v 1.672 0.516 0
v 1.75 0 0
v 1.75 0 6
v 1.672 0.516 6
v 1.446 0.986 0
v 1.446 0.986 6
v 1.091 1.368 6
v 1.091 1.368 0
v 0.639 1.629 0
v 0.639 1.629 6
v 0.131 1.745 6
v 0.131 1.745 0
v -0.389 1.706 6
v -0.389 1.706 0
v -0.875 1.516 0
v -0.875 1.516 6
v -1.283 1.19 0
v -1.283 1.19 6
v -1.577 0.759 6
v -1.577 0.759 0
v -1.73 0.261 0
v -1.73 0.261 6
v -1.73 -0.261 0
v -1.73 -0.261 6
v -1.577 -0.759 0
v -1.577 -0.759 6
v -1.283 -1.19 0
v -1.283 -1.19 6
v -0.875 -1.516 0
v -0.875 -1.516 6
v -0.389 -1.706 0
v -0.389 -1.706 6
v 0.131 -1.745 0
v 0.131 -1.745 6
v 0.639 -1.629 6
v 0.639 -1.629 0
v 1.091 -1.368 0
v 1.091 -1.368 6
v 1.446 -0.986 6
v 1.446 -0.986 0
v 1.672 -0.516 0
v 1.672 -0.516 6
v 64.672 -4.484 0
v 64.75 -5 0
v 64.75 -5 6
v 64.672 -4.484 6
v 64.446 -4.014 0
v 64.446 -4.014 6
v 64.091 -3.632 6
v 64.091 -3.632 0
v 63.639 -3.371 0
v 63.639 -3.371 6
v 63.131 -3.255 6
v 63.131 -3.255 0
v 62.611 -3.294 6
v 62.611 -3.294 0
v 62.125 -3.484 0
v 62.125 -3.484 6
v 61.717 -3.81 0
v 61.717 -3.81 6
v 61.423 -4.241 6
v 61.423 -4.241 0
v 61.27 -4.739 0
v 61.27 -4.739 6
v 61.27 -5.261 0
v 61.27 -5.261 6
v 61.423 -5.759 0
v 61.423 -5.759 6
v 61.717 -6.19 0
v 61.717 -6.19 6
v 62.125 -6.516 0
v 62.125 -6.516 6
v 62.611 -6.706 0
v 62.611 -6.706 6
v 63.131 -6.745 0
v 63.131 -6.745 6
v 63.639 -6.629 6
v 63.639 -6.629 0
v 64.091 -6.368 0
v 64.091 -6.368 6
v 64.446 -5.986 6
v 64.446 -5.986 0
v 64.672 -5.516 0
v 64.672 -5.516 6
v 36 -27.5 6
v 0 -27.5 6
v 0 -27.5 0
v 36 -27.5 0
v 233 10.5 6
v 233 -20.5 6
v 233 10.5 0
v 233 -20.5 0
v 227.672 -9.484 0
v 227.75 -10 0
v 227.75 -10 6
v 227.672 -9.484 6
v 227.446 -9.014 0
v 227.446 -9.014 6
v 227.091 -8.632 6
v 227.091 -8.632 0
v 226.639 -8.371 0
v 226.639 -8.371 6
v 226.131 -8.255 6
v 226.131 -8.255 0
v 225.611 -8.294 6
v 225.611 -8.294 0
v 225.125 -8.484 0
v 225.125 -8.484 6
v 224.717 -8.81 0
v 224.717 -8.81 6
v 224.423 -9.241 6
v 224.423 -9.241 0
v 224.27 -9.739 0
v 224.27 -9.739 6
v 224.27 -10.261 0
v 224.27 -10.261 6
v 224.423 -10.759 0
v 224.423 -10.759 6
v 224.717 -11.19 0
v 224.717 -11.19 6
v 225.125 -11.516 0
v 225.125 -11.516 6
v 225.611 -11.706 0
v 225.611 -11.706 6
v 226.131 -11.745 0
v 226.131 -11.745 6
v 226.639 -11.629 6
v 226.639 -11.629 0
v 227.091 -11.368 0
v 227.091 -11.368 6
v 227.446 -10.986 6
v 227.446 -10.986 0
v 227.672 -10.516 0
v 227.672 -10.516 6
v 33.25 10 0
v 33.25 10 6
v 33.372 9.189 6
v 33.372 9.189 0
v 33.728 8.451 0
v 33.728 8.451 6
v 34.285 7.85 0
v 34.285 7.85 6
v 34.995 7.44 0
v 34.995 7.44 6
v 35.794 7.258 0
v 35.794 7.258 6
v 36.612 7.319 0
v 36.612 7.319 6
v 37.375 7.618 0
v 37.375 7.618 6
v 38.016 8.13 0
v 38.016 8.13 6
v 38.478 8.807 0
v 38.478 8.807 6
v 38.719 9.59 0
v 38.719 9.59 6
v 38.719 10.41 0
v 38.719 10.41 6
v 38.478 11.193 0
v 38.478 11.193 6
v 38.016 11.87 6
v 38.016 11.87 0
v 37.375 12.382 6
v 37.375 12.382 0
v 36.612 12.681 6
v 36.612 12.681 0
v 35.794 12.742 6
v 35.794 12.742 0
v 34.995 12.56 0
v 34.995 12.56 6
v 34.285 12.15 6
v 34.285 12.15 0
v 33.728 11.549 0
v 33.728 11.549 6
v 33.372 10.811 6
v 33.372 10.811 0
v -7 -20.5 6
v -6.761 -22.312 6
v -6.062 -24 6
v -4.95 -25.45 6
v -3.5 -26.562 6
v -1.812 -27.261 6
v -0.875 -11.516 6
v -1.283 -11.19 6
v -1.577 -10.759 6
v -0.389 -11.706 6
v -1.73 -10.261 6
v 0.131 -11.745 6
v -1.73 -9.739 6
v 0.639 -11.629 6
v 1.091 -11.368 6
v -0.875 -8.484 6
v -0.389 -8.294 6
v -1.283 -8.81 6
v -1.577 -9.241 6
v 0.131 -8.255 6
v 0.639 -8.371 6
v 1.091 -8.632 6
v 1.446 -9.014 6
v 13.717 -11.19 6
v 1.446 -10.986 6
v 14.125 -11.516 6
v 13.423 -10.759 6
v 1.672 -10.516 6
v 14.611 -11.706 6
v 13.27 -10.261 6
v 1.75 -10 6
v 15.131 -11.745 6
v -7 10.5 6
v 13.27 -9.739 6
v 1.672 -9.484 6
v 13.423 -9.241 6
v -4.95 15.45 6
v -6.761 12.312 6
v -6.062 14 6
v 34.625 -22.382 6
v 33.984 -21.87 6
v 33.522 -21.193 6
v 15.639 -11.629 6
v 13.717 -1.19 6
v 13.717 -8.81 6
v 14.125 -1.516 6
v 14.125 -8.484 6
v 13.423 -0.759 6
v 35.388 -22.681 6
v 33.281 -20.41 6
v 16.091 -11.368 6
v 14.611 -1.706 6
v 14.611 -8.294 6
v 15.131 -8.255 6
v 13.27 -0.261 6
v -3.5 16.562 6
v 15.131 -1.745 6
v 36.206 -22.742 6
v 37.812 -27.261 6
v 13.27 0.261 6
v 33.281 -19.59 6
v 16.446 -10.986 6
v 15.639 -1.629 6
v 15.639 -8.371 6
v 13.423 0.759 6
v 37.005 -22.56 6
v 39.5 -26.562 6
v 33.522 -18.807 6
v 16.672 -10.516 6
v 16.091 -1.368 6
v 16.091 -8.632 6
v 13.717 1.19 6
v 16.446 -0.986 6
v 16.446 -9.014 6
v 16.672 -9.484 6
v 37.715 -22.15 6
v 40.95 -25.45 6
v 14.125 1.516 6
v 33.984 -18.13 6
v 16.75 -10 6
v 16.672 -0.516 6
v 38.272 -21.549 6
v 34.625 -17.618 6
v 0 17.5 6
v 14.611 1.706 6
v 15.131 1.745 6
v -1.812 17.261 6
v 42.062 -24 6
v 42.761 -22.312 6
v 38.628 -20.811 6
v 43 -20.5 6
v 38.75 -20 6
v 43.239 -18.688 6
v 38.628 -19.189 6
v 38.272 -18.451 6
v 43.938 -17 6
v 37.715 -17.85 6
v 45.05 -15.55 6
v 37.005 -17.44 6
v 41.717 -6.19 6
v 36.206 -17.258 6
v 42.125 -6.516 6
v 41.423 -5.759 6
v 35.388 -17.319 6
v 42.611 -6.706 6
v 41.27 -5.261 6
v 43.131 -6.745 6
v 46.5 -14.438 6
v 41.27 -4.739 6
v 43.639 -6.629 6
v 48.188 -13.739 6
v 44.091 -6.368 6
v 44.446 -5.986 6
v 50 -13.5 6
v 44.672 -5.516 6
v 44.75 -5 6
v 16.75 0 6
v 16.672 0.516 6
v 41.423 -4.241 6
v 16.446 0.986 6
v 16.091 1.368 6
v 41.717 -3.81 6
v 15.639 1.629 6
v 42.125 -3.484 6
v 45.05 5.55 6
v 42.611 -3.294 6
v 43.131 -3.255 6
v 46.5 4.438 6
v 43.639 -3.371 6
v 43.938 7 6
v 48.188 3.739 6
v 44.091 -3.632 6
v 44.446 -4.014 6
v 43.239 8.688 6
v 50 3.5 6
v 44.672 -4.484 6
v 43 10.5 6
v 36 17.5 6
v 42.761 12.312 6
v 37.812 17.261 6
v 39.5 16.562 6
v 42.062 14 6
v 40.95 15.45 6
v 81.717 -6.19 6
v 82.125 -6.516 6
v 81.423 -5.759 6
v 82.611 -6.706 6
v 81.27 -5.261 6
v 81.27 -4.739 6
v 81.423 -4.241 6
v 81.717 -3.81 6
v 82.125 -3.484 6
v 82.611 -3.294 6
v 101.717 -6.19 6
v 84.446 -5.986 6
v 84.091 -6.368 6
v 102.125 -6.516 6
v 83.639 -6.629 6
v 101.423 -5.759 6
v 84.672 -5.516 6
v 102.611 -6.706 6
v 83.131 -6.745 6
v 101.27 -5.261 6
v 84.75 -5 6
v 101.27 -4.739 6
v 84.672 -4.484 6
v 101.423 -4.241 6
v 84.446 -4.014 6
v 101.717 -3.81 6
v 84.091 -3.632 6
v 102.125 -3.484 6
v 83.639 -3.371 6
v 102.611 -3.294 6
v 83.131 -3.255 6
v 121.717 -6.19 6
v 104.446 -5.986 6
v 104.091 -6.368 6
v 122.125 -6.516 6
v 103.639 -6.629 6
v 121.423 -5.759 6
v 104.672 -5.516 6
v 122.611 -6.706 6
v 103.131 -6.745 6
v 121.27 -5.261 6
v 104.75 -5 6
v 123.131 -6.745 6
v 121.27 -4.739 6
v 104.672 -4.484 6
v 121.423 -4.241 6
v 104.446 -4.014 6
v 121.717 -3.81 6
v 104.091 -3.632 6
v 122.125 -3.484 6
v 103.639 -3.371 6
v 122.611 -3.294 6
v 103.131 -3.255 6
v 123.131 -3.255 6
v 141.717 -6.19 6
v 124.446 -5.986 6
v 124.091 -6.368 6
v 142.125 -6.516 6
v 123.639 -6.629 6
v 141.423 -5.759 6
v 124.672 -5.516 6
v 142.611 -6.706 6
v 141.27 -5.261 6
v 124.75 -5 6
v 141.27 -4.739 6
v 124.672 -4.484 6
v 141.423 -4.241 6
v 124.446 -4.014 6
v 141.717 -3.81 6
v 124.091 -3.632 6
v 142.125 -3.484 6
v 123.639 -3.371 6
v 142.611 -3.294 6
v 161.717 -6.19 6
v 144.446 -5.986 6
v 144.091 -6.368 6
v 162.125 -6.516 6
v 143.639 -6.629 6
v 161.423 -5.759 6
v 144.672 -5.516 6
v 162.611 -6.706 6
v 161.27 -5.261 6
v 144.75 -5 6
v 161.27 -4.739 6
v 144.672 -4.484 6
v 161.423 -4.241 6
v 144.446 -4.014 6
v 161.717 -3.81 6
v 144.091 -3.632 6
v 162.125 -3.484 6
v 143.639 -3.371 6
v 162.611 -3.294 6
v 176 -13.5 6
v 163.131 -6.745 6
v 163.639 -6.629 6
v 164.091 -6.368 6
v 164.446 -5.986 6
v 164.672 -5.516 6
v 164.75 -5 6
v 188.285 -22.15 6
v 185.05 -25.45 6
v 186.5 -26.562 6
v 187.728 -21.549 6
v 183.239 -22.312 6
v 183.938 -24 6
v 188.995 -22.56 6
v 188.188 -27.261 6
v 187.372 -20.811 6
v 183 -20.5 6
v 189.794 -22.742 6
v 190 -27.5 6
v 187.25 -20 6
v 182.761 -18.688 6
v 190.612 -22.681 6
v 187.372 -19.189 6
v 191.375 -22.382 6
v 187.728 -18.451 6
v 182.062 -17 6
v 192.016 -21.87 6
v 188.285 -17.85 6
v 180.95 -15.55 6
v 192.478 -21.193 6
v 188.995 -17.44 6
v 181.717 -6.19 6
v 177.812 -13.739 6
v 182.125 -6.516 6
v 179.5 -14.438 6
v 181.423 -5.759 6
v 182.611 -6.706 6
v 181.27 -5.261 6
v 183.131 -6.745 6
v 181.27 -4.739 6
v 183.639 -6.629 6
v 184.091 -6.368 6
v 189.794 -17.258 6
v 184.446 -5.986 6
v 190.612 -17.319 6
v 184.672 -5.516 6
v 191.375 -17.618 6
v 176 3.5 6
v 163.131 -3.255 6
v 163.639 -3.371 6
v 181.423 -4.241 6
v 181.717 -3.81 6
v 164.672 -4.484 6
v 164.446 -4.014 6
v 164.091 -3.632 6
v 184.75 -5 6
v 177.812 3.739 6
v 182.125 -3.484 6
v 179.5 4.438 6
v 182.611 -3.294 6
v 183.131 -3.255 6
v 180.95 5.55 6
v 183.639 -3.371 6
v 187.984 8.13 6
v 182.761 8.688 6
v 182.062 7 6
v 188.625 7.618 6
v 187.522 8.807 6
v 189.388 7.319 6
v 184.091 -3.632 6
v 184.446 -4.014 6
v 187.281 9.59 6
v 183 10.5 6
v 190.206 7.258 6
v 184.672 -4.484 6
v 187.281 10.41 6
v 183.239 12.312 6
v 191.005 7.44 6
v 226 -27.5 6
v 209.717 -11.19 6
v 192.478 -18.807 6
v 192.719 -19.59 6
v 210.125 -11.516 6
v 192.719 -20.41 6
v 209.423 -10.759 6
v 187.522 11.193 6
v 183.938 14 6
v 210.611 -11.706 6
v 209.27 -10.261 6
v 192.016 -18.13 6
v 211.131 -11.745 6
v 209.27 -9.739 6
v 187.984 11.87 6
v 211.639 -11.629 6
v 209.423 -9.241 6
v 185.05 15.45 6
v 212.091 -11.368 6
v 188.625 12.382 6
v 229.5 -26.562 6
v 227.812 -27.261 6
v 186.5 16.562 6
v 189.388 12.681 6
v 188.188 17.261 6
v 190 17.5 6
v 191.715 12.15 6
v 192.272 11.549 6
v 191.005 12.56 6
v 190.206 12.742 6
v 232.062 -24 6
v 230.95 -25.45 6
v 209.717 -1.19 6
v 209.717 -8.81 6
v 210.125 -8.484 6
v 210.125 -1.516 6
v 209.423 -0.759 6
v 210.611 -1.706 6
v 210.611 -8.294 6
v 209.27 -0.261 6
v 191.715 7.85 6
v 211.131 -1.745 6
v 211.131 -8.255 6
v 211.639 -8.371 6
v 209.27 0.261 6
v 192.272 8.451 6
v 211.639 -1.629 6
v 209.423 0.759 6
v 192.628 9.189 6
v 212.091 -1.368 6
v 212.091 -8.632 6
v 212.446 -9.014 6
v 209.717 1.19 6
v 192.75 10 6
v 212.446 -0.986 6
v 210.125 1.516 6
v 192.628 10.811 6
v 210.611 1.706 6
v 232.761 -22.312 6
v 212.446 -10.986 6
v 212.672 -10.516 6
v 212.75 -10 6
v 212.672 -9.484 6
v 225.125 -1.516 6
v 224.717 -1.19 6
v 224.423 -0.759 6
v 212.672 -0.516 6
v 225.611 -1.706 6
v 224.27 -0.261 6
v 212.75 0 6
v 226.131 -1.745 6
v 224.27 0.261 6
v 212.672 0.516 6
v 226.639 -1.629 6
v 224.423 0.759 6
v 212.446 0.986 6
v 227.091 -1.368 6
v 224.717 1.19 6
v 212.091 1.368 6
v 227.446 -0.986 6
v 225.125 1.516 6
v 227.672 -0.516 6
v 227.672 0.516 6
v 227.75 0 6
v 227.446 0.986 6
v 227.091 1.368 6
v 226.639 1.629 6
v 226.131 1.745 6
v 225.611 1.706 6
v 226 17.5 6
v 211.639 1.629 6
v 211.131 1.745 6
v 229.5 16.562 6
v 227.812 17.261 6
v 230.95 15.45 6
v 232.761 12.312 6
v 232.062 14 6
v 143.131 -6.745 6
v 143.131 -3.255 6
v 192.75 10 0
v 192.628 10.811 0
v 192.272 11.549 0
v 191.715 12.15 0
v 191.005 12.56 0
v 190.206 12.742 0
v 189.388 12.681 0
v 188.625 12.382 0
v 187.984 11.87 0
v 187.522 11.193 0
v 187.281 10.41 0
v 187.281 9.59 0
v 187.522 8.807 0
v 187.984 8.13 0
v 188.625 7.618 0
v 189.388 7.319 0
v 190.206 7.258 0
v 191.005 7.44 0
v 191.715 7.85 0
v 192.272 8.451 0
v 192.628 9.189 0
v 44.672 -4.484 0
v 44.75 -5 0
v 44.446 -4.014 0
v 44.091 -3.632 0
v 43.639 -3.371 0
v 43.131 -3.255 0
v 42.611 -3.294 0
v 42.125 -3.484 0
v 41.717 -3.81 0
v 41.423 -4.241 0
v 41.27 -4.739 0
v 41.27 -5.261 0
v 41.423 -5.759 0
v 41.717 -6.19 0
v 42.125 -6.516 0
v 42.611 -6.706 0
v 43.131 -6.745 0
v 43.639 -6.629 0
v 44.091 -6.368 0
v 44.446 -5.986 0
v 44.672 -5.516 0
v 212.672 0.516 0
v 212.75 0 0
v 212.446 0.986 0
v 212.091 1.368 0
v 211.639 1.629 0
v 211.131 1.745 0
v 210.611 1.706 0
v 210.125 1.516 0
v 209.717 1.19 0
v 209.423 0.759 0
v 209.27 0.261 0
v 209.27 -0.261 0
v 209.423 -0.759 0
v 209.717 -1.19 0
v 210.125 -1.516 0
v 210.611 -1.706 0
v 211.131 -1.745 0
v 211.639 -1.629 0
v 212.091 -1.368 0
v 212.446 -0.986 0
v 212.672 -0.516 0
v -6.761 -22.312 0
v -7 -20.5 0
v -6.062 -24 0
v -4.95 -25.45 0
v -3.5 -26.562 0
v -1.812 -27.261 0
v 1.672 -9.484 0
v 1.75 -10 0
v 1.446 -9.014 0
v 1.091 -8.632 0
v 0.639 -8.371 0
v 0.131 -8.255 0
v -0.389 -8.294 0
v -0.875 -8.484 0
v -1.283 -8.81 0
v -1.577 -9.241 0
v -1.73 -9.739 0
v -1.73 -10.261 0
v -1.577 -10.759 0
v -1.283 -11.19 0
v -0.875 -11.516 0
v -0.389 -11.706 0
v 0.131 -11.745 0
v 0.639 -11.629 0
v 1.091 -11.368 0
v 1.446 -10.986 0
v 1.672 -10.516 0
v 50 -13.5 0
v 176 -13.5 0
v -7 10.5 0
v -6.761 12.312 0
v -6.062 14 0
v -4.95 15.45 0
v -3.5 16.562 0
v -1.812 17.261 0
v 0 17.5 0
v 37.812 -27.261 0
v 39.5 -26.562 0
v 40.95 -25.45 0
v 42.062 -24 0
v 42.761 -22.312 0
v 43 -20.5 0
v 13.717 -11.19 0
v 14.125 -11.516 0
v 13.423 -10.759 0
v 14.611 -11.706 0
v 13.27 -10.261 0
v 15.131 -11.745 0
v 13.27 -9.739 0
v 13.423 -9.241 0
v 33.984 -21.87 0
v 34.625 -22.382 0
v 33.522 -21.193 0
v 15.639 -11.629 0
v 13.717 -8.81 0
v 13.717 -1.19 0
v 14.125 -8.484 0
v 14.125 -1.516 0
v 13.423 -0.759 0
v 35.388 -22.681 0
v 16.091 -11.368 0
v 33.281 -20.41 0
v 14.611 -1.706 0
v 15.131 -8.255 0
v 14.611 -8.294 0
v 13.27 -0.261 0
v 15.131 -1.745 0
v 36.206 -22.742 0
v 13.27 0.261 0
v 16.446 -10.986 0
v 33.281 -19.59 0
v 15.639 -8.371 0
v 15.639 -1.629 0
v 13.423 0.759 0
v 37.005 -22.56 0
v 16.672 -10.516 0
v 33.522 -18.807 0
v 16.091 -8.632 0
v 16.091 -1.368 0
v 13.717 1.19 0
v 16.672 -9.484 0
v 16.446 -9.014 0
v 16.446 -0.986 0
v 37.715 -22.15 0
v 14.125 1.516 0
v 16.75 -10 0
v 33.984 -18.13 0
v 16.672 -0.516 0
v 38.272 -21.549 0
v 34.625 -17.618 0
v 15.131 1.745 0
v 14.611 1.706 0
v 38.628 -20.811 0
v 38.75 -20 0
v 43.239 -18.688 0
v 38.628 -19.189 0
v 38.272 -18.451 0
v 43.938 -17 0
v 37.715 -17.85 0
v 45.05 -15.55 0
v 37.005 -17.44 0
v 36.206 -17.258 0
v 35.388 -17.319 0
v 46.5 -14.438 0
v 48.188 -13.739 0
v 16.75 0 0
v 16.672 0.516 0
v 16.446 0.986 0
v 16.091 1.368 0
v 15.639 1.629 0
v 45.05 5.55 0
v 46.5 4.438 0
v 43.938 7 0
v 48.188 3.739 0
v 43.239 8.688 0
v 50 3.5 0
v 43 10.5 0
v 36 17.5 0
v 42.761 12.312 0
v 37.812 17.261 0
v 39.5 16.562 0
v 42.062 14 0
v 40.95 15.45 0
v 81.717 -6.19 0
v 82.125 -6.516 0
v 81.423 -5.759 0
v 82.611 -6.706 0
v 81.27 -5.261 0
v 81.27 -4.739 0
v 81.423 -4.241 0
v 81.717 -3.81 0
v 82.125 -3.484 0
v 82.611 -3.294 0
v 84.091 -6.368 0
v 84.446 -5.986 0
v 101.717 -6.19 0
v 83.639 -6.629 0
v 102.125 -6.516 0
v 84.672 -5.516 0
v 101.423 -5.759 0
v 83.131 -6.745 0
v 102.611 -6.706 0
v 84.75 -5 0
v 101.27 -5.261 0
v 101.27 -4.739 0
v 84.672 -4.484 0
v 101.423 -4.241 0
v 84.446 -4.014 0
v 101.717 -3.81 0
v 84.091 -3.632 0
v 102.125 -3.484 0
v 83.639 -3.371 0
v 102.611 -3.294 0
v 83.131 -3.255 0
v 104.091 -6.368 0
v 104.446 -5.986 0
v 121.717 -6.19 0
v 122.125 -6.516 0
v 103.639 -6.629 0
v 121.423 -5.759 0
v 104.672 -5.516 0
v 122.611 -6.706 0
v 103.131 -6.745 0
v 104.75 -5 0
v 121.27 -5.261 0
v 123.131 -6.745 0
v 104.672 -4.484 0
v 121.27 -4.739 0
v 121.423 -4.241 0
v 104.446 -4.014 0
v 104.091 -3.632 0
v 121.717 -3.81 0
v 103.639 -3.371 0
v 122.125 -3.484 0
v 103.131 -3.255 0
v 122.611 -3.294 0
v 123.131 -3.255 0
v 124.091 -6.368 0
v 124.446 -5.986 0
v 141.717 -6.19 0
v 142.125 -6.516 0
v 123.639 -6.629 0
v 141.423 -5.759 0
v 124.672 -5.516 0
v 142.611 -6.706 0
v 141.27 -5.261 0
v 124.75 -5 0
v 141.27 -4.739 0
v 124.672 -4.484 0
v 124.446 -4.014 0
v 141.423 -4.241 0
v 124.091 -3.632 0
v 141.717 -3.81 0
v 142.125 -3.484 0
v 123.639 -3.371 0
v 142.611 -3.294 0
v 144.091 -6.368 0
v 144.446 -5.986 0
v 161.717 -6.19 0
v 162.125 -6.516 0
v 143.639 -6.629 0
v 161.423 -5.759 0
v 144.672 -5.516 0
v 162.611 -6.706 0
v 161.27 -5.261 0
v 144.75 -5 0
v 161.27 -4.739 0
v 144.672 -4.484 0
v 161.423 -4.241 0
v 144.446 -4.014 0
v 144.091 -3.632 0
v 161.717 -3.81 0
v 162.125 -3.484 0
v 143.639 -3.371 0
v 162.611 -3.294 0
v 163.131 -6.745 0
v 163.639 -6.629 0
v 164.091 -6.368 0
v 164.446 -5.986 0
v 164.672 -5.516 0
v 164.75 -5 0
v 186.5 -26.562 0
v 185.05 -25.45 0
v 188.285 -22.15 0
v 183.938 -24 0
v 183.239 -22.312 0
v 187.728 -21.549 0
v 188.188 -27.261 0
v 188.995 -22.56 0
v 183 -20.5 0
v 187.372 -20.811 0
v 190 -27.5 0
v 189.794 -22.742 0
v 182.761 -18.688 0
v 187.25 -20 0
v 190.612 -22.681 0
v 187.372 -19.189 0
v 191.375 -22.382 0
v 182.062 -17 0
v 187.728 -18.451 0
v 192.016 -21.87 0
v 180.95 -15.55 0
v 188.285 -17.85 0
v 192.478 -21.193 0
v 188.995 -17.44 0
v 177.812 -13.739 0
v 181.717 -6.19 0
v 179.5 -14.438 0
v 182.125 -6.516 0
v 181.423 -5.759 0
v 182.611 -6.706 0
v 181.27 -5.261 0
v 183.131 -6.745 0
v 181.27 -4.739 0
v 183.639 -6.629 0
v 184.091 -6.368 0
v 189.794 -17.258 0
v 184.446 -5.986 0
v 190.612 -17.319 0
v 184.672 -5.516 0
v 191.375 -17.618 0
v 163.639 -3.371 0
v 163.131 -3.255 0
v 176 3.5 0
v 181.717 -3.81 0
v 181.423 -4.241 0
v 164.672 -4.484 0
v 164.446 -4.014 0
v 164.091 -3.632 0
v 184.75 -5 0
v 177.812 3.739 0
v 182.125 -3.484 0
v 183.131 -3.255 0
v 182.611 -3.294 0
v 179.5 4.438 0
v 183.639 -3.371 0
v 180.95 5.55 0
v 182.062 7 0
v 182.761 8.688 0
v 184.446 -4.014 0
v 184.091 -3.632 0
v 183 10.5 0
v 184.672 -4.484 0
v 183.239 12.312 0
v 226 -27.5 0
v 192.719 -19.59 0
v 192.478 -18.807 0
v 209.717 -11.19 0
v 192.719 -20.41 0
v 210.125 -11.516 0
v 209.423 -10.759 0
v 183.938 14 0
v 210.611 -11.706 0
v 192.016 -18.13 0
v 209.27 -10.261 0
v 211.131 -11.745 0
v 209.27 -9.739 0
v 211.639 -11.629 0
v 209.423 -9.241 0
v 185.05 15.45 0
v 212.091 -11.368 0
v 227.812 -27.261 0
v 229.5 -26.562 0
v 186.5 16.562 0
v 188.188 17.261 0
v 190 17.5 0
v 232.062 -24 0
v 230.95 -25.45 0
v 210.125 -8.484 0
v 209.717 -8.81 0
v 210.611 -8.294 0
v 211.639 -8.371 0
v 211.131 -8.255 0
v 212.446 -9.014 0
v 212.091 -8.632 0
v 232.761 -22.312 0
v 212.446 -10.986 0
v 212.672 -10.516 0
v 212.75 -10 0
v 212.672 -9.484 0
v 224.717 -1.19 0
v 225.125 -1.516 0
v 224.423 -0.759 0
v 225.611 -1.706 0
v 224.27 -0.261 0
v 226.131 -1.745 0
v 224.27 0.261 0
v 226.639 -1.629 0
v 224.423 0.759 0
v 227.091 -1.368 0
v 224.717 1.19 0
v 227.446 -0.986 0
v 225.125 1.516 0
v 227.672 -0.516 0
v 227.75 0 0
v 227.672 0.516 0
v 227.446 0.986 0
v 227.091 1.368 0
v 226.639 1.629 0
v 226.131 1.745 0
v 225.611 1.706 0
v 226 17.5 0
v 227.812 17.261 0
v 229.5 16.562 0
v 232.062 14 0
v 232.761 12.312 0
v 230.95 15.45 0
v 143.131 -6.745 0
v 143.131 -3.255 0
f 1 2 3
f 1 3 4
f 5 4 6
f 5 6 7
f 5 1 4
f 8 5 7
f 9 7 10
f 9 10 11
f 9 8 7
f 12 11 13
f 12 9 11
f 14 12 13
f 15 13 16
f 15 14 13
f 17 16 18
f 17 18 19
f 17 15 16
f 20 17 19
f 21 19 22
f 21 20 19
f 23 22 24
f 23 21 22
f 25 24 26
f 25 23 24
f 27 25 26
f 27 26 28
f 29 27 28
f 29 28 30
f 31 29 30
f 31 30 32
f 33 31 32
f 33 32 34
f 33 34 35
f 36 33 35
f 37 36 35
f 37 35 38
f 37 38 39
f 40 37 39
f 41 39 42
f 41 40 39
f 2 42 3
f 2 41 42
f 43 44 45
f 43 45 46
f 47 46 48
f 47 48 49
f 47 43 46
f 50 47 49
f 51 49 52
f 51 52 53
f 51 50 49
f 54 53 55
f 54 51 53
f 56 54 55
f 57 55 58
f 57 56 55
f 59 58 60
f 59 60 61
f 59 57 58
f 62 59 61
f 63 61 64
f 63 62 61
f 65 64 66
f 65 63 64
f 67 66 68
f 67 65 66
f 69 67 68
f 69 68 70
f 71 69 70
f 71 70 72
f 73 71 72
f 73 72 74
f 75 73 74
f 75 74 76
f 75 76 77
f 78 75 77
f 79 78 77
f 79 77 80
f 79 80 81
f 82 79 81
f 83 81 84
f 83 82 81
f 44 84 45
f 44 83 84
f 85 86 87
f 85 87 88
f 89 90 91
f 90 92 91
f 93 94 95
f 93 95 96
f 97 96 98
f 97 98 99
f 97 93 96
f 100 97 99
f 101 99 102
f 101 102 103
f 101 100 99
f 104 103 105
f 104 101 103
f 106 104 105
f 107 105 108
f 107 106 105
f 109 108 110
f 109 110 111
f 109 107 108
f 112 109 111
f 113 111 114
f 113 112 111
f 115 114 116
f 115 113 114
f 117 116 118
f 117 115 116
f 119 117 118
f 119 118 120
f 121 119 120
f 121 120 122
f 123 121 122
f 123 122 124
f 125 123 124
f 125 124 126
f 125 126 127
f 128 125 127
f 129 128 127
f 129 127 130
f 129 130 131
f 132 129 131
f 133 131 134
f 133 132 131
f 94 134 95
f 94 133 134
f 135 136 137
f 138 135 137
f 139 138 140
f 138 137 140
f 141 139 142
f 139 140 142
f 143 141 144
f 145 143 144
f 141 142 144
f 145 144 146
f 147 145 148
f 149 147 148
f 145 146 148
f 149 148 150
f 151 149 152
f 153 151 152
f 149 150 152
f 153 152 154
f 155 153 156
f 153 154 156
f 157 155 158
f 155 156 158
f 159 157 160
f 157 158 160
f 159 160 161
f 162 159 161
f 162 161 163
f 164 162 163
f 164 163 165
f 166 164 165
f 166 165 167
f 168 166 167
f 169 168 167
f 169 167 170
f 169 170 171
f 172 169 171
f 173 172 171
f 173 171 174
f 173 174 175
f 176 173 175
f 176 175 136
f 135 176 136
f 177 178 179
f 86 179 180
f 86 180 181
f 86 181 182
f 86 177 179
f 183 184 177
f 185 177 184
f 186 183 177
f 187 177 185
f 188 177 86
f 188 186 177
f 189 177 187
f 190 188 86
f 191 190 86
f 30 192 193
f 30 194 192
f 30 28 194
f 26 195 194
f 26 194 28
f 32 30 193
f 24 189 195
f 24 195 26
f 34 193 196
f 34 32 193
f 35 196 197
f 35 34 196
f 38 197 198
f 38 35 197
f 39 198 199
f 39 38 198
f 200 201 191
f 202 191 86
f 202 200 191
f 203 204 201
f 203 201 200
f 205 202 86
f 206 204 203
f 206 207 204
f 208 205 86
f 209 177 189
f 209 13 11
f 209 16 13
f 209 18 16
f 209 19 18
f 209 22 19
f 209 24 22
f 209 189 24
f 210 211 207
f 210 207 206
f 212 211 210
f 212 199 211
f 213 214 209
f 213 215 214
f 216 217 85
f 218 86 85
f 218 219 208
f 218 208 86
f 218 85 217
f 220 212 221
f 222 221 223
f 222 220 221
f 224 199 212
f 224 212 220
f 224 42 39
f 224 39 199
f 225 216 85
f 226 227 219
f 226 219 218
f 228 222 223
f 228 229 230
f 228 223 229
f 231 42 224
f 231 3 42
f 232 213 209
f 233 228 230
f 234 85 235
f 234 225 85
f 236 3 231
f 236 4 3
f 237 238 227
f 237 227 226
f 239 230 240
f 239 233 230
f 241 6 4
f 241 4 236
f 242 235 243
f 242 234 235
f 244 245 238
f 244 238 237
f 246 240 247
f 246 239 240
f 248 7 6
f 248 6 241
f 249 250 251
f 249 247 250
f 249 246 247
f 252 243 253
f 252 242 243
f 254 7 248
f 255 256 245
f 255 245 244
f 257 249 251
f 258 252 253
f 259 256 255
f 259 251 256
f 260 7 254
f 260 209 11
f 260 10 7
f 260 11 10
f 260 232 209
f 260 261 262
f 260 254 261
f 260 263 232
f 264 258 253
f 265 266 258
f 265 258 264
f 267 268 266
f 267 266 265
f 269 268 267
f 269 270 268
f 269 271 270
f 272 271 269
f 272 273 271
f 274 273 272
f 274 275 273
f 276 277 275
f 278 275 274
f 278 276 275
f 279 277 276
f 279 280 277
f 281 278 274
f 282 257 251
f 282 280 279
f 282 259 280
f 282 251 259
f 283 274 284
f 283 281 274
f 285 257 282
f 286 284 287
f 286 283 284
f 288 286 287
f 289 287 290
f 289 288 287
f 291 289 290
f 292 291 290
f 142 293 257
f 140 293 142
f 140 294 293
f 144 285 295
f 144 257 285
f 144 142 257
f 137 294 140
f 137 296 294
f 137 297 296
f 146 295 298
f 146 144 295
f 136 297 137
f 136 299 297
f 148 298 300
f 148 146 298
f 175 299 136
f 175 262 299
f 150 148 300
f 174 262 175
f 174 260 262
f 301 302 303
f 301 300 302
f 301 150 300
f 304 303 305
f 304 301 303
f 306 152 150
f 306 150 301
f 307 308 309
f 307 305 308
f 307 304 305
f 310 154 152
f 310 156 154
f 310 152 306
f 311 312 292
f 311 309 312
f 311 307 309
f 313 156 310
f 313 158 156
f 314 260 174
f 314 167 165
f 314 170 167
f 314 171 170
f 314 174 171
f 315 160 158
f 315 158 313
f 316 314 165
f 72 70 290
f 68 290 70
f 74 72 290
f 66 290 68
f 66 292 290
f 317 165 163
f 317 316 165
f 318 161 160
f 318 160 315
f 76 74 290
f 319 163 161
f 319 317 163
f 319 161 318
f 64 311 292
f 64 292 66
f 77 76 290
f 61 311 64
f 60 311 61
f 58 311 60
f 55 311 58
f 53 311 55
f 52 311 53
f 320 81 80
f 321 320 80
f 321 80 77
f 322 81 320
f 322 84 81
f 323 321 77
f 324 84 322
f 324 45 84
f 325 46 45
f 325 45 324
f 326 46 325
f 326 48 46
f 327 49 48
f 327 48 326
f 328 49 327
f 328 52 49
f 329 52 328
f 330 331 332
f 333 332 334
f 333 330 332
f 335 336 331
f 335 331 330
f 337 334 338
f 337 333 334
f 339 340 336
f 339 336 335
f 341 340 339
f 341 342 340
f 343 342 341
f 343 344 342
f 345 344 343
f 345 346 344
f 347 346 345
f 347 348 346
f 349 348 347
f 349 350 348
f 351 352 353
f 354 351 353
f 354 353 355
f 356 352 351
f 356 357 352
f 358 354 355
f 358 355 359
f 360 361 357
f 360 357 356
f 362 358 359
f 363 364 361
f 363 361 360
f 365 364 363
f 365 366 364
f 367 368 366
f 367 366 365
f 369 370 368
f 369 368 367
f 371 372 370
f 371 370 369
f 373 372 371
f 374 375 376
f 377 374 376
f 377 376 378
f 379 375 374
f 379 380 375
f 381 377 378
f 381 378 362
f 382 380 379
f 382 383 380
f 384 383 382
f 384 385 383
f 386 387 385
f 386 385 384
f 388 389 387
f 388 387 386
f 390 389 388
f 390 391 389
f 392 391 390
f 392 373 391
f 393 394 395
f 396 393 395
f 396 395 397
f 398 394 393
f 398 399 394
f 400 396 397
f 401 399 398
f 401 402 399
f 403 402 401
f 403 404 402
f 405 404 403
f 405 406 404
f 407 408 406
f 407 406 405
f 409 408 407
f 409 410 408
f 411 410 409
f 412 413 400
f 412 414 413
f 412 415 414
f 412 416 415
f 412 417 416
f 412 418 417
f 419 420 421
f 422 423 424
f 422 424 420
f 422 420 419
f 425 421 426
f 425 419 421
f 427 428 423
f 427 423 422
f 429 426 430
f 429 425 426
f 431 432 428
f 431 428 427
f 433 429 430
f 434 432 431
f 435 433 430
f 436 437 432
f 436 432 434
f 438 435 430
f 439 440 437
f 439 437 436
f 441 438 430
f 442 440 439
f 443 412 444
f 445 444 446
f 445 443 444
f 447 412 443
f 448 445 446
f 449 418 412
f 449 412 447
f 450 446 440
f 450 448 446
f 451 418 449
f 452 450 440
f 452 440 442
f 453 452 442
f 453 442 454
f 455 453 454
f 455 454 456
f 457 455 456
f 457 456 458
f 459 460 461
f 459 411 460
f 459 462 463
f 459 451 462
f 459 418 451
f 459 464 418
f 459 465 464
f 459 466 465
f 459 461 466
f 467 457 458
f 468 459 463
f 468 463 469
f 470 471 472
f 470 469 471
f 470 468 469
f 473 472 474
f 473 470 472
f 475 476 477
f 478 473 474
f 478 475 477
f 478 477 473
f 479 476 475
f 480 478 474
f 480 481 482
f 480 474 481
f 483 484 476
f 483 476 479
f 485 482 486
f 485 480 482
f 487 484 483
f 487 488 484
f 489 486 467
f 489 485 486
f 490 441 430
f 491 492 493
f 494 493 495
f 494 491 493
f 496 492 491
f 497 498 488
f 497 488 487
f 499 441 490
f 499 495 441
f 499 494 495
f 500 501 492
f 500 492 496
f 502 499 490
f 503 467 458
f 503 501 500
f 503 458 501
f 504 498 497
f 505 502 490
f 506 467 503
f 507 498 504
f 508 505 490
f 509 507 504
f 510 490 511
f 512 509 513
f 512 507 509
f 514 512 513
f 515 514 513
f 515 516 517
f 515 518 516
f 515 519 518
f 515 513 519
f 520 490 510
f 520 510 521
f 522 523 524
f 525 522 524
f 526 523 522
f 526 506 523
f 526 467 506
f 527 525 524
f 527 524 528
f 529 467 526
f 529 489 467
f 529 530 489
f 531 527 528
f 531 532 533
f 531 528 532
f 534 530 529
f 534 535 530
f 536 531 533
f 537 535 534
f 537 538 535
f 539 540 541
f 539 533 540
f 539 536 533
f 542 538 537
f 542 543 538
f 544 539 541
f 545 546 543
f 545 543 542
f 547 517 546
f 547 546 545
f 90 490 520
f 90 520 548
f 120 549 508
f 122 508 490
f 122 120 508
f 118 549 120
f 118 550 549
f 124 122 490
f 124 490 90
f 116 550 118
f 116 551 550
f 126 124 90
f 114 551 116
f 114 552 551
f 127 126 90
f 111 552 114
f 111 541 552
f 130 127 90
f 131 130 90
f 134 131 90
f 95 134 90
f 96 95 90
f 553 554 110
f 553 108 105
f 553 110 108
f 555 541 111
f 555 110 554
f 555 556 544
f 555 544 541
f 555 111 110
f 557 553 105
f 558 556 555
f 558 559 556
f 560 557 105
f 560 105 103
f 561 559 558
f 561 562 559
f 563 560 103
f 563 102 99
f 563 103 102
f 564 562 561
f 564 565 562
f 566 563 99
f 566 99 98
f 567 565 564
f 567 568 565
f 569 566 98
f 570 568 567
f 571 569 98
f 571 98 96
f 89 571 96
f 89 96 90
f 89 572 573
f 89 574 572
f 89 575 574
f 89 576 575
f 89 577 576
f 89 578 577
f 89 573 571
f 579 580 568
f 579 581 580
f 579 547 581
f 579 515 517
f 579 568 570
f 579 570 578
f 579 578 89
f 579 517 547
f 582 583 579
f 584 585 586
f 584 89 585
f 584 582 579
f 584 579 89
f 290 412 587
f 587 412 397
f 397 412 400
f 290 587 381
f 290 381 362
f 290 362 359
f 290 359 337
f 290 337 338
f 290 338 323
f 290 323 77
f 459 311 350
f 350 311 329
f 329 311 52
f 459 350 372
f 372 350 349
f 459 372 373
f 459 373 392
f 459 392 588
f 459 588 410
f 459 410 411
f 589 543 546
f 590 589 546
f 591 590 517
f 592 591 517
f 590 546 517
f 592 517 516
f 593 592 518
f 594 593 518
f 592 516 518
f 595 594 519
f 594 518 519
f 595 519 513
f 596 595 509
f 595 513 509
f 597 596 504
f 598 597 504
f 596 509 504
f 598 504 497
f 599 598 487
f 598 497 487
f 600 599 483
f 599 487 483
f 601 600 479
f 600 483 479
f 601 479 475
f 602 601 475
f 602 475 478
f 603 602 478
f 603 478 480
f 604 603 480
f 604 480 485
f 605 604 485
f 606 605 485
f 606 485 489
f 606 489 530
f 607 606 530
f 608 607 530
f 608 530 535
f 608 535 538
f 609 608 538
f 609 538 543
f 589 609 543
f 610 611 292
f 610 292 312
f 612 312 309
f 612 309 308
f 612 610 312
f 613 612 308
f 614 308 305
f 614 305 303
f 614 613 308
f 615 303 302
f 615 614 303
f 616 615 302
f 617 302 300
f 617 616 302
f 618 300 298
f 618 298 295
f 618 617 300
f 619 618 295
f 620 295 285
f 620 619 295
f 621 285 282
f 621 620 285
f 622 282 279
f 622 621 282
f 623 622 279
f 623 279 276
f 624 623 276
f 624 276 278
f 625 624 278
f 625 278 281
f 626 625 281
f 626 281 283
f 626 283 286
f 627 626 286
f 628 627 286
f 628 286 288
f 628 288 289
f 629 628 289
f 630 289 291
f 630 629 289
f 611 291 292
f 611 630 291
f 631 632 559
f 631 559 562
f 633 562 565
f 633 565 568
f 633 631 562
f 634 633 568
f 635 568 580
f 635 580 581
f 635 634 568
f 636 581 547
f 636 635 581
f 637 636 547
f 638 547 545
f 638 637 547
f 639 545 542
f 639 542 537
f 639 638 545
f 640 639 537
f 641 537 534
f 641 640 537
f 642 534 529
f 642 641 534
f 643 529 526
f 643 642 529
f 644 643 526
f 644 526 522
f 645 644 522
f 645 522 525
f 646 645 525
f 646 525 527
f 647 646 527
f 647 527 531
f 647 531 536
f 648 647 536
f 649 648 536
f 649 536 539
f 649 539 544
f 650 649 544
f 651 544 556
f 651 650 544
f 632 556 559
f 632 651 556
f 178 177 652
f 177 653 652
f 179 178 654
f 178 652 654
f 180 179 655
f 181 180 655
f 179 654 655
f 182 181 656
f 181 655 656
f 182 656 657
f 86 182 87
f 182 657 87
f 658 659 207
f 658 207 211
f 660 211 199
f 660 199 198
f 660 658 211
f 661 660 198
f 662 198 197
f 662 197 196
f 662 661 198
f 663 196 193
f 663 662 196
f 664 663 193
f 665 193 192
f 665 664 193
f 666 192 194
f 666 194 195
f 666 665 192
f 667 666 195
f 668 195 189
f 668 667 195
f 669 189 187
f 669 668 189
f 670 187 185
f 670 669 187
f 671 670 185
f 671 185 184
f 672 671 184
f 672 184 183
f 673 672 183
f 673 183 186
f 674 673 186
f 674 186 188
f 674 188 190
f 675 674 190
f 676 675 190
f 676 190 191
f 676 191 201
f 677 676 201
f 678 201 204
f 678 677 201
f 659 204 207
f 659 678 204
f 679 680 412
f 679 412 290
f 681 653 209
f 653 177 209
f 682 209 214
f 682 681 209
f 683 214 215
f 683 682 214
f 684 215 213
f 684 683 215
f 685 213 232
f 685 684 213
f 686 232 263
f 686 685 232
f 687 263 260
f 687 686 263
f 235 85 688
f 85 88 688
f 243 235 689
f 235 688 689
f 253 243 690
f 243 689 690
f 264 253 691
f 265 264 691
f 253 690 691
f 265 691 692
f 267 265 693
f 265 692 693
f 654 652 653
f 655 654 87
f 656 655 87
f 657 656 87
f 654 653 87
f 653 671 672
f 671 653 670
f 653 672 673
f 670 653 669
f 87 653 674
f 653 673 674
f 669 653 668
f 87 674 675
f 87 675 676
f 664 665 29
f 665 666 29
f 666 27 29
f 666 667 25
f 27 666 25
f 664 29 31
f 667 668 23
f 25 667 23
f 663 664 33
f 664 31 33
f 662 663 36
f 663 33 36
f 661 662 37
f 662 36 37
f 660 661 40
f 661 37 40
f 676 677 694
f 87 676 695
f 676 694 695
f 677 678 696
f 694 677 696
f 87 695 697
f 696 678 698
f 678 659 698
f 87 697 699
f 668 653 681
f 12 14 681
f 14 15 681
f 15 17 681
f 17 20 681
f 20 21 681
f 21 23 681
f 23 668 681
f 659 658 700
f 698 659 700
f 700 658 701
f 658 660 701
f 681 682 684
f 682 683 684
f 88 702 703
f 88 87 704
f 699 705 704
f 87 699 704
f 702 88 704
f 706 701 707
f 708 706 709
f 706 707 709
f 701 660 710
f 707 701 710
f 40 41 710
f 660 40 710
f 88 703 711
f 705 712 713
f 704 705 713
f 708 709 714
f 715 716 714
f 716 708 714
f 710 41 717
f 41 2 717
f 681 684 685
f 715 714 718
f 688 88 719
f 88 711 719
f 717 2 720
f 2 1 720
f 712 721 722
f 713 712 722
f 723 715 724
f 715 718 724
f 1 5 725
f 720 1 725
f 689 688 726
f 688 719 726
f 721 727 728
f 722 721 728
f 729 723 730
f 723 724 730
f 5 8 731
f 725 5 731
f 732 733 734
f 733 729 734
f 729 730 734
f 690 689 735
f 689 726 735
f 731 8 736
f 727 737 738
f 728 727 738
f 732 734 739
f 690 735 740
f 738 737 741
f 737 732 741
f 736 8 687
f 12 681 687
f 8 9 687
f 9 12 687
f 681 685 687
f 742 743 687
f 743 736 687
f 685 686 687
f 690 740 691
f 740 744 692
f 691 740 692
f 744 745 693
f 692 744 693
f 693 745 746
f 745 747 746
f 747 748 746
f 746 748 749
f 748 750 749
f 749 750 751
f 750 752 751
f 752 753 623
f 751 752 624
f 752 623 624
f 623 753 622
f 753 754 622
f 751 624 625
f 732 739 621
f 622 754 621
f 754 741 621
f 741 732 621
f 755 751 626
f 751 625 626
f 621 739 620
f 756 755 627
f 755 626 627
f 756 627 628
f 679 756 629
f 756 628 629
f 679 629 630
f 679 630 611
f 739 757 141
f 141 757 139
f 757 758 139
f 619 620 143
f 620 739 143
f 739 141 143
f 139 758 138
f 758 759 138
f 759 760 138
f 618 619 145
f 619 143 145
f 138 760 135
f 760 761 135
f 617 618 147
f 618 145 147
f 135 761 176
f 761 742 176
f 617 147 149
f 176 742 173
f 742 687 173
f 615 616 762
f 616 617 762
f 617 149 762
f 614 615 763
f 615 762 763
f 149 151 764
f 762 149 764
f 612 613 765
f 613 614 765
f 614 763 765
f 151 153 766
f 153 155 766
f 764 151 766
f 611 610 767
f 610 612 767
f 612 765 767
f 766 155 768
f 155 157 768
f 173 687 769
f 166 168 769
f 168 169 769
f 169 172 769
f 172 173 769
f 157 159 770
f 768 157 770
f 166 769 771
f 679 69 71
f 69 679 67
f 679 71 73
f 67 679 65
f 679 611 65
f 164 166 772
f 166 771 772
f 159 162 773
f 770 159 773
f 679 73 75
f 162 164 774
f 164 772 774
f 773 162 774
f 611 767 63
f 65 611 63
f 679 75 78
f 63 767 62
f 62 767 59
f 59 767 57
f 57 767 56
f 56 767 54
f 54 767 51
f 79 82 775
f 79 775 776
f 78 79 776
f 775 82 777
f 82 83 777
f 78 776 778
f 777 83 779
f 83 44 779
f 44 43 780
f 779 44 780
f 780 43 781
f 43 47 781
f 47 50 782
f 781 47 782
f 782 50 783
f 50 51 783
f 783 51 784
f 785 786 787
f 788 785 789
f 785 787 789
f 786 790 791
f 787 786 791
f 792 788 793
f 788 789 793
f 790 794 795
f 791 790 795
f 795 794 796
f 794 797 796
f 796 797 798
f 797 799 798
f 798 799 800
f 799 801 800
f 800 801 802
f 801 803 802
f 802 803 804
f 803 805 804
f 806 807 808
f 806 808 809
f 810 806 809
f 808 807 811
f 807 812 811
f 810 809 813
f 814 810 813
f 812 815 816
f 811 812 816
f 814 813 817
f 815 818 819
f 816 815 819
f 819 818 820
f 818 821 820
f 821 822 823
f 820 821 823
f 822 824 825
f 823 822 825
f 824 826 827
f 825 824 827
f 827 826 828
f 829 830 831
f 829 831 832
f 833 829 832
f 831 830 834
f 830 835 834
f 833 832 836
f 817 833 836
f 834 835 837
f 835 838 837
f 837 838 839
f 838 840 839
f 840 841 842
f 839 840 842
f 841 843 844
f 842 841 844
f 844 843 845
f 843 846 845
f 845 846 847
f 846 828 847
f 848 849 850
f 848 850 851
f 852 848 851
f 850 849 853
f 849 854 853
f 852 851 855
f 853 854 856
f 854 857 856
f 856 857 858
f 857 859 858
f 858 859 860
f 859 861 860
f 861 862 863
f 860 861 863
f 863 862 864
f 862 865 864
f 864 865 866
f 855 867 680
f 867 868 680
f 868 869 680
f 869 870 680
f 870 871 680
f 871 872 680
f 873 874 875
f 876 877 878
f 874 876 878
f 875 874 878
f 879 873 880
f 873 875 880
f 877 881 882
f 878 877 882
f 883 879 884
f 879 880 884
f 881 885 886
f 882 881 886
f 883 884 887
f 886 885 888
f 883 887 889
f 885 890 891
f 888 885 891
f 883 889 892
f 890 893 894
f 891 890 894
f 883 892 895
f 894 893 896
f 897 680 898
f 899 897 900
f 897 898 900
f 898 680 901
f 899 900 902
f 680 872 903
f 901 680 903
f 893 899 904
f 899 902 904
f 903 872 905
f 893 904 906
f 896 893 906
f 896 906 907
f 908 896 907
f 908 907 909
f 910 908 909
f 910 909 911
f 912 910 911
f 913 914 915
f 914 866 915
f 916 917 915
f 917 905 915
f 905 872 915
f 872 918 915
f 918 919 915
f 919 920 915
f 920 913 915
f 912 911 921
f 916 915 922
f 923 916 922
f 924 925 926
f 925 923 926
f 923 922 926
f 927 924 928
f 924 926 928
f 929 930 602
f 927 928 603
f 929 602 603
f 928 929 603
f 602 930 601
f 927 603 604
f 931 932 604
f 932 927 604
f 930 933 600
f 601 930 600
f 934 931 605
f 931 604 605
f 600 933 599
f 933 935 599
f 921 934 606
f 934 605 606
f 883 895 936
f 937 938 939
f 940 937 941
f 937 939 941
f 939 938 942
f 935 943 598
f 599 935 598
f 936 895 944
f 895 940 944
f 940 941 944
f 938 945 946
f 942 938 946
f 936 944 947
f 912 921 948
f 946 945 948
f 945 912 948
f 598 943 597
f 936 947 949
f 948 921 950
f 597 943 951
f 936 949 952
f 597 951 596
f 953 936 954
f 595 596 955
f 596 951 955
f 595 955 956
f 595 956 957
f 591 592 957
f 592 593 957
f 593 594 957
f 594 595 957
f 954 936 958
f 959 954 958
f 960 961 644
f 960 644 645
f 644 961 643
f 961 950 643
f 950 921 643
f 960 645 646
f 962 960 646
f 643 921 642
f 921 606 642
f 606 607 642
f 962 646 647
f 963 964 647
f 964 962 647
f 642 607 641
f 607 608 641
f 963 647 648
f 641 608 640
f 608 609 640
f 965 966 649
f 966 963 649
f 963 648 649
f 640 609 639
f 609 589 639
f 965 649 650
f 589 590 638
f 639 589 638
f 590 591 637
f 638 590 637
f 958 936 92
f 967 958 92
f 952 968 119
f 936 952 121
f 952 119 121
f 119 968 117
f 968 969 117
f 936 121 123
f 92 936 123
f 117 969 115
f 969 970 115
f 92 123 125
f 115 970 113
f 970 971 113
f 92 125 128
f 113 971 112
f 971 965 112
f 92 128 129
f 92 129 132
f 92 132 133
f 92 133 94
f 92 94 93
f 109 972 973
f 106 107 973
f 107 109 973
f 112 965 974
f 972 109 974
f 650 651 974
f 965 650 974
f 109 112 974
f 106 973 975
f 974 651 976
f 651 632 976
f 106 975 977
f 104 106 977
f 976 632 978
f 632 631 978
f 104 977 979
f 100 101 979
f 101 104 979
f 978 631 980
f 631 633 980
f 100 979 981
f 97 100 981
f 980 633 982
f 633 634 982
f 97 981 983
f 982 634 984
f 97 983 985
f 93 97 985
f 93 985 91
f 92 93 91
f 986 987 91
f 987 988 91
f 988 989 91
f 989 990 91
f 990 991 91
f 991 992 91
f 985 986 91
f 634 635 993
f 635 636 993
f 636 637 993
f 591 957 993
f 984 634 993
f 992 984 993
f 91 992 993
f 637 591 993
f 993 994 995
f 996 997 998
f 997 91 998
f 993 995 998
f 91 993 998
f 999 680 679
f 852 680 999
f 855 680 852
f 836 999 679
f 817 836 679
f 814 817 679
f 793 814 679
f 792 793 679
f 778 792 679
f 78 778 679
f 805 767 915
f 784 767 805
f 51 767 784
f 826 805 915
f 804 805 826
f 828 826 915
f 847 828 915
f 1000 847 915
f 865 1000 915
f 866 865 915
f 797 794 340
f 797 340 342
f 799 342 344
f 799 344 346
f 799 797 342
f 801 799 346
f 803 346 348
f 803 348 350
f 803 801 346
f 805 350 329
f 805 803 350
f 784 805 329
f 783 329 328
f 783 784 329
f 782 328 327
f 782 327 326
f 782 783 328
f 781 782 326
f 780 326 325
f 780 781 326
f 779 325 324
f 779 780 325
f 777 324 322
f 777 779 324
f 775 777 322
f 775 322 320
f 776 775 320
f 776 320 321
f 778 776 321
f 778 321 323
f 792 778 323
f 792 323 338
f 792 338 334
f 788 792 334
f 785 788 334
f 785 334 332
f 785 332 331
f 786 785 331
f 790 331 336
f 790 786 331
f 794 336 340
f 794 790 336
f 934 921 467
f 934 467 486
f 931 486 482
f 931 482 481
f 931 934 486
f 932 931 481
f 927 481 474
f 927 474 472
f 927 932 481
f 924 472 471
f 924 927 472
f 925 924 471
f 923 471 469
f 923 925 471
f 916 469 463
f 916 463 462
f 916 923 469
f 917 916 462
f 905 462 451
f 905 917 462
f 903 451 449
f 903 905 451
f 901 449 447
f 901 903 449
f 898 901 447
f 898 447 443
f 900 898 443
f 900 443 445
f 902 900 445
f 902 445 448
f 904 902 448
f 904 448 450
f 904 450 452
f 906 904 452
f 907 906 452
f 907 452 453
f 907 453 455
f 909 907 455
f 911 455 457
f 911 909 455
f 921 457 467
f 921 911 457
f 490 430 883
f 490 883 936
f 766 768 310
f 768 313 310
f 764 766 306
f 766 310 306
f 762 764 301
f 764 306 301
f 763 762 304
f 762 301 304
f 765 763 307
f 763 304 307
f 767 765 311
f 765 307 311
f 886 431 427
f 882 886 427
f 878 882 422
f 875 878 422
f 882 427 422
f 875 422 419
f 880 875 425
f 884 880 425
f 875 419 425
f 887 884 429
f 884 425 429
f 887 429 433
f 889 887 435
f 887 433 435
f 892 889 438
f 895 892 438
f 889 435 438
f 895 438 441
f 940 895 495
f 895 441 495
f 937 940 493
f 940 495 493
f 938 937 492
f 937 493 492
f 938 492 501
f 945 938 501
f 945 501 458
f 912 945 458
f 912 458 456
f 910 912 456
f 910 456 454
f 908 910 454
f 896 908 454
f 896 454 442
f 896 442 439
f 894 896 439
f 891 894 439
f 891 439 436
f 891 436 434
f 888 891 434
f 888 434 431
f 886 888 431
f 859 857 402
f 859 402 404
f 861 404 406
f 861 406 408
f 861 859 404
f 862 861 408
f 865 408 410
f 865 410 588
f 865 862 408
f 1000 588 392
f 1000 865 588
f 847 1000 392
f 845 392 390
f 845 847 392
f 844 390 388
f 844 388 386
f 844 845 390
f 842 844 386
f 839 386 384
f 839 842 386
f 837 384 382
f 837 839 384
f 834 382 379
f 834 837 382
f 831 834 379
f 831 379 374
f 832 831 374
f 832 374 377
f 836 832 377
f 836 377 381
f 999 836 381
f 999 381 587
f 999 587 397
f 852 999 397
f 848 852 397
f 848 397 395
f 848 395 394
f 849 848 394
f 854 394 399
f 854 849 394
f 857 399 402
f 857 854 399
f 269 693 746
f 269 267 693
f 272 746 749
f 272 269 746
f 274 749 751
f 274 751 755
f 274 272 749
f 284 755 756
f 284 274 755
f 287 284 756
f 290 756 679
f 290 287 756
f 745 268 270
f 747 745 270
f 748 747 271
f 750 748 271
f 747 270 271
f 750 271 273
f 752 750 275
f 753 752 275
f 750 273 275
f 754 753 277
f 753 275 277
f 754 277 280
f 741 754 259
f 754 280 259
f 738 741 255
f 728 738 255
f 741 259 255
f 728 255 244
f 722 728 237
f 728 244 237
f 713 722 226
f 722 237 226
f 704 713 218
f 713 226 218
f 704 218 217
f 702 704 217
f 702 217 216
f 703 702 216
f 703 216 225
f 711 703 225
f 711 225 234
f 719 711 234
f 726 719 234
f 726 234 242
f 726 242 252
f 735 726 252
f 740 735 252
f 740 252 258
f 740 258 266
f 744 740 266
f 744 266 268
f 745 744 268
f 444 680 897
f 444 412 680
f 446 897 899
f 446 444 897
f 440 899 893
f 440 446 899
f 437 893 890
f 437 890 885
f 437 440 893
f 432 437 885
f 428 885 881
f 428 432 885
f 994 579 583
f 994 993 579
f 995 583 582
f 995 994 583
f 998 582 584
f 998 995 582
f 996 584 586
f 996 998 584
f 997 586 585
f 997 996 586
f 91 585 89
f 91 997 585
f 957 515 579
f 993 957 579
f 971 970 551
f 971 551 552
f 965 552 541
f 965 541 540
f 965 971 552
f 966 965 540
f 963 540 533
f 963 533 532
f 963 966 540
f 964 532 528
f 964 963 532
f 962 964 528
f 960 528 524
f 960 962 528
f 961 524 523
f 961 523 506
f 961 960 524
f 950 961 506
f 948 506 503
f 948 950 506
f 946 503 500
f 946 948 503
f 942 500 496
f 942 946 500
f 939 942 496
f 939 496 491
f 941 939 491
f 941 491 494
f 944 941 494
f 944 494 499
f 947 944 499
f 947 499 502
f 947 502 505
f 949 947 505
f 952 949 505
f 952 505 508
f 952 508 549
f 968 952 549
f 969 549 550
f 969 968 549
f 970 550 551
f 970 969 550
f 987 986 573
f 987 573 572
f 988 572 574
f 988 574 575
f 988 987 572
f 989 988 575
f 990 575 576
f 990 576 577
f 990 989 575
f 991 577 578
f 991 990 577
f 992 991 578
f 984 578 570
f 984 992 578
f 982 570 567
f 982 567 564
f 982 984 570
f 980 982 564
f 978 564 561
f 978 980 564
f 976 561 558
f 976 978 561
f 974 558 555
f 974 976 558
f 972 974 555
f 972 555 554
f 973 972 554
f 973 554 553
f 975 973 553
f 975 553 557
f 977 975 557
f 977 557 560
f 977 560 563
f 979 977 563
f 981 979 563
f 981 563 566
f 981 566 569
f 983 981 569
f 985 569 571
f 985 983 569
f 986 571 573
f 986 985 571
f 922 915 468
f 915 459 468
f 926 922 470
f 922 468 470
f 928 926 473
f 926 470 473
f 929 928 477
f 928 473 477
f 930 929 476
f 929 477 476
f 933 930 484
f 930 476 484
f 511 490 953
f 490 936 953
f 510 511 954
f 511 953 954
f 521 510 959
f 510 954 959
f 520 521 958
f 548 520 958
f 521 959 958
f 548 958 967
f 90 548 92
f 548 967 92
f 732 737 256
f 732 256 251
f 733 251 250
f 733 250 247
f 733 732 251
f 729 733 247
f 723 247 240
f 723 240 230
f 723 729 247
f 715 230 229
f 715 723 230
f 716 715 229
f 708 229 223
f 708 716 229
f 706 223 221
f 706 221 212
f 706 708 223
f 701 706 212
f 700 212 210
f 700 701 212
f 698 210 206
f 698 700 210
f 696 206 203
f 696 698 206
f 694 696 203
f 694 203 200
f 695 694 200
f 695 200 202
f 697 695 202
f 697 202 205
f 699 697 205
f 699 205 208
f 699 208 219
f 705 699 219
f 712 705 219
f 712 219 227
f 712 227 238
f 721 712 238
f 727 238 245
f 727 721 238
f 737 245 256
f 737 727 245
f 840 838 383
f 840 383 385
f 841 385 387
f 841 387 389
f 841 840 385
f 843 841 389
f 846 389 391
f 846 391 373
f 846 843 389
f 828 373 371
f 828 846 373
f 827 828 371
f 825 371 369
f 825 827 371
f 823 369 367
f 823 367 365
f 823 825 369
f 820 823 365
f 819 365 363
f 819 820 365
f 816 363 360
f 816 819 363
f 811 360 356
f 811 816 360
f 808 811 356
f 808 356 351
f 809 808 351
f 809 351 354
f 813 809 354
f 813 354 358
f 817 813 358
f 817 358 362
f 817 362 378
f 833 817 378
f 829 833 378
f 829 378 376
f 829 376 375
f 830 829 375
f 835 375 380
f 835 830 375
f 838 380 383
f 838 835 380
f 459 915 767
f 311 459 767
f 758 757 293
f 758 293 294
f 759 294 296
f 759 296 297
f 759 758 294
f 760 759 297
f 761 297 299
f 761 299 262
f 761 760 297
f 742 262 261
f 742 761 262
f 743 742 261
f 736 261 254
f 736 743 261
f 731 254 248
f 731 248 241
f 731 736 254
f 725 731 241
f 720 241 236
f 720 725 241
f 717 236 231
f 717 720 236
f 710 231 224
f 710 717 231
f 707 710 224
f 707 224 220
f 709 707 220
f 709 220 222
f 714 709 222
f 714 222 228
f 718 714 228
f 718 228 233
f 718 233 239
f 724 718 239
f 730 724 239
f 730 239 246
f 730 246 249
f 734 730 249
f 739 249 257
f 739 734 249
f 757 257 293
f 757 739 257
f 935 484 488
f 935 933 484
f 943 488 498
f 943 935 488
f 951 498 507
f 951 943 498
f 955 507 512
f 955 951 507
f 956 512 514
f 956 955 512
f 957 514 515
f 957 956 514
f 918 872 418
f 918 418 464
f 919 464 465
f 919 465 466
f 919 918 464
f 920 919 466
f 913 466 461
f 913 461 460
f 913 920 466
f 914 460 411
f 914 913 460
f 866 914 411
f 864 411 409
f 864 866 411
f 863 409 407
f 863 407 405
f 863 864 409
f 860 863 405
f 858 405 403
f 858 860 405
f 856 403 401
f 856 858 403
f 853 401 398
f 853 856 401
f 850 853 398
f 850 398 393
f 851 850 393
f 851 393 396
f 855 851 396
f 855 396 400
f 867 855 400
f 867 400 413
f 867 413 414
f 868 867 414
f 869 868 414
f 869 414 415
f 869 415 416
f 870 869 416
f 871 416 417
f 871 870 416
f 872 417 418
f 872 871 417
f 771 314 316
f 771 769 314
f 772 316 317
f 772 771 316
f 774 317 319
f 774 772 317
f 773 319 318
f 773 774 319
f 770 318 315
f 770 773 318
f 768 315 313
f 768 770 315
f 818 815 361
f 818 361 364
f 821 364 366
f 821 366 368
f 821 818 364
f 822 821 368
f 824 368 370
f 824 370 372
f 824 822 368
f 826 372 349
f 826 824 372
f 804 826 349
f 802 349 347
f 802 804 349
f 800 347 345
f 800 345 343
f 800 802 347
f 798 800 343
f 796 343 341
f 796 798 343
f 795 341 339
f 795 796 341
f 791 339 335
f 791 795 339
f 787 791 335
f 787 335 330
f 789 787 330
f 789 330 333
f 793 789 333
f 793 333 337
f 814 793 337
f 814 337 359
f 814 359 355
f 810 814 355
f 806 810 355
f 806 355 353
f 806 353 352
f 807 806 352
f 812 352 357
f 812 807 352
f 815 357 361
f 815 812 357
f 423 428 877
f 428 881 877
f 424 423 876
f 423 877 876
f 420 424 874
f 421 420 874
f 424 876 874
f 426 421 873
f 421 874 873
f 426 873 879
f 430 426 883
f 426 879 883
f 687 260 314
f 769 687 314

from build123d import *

# Parameters (mm, degrees)
SKETCH1_W           = 240
SKETCH1_H           = 25
SKETCH1_R           = 1.75
BOSS_EXTRUDE1_DEPTH = 6
SKETCH2_W           = 50
SKETCH2_H           = 10
BOSS_EXTRUDE2_DEPTH = 6
SKETCH3_W           = 140
SKETCH3_H           = 4
CUT_EXTRUDE1_DEPTH  = 235.693949645
SKETCH4_R           = 2.75
CUT_EXTRUDE2_DEPTH  = 235.693949645
FILLET1_R           = 7


with BuildPart() as part:
    # Sketch1 → Boss-Extrude1 (new body)
    with BuildSketch(Plane.XY):
        with Locations((113, -5)):
            Rectangle(SKETCH1_W, SKETCH1_H)
        Circle(SKETCH1_R, mode=Mode.SUBTRACT)
        with Locations((226, 0)):
            Circle(SKETCH1_R, mode=Mode.SUBTRACT)
        with Locations((15, 0)):
            Circle(SKETCH1_R, mode=Mode.SUBTRACT)
        with Locations((0, -10)):
            Circle(SKETCH1_R, mode=Mode.SUBTRACT)
        with Locations((15, -10)):
            Circle(SKETCH1_R, mode=Mode.SUBTRACT)
        with Locations((211, 0)):
            Circle(SKETCH1_R, mode=Mode.SUBTRACT)
        with Locations((211, -10)):
            Circle(SKETCH1_R, mode=Mode.SUBTRACT)
        with Locations((226, -10)):
            Circle(SKETCH1_R, mode=Mode.SUBTRACT)
        with Locations((183, -5)):
            Circle(SKETCH1_R, mode=Mode.SUBTRACT)
        with Locations((163, -5)):
            Circle(SKETCH1_R, mode=Mode.SUBTRACT)
        with Locations((143, -5)):
            Circle(SKETCH1_R, mode=Mode.SUBTRACT)
        with Locations((123, -5)):
            Circle(SKETCH1_R, mode=Mode.SUBTRACT)
        with Locations((103, -5)):
            Circle(SKETCH1_R, mode=Mode.SUBTRACT)
        with Locations((83, -5)):
            Circle(SKETCH1_R, mode=Mode.SUBTRACT)
        with Locations((63, -5)):
            Circle(SKETCH1_R, mode=Mode.SUBTRACT)
        with Locations((43, -5)):
            Circle(SKETCH1_R, mode=Mode.SUBTRACT)
    extrude(amount=BOSS_EXTRUDE1_DEPTH)

    # Sketch2 → Boss-Extrude2 (add)
    with BuildSketch(Plane.XY.offset(6)):
        with Locations((18, -22.5)):
            Rectangle(SKETCH2_W, SKETCH2_H)
        with Locations((18, 12.5)):
            Rectangle(SKETCH2_W, SKETCH2_H)
        with Locations((208, 12.5)):
            Rectangle(SKETCH2_W, SKETCH2_H)
        with Locations((208, -22.5)):
            Rectangle(SKETCH2_W, SKETCH2_H)
    extrude(amount=-BOSS_EXTRUDE2_DEPTH)

    # Sketch3 → Cut-Extrude1 (cut, through all)
    with BuildSketch(Plane(origin=(0, 0, 0), x_dir=(-1, 0, 0), z_dir=(0, 0, -1))):
        with Locations((-113, 5.5)):
            Rectangle(SKETCH3_W, SKETCH3_H)
        with Locations((-113, -15.5)):
            Rectangle(SKETCH3_W, SKETCH3_H)
    extrude(amount=-CUT_EXTRUDE1_DEPTH, mode=Mode.SUBTRACT)

    # Sketch4 → Cut-Extrude2 (cut, through all)
    with BuildSketch(Plane.XY.offset(6)):
        with Locations((36, -20)):
            Circle(SKETCH4_R)
        with Locations(Location((36, 10, 0), (0, 0, 180))):
            Circle(SKETCH4_R)
        with Locations((190, 10)):
            Circle(SKETCH4_R)
        with Locations(Location((190, -20, 0), (0, 0, 180))):
            Circle(SKETCH4_R)
    extrude(amount=-CUT_EXTRUDE2_DEPTH, mode=Mode.SUBTRACT)

    # Fillet1
    fillet1_edges = [part.edges().sort_by_distance(p)[0] for p in [
        (183, 3.5, 3),
        (183, 17.5, 3),
        (233, 17.5, 3),
        (233, -27.5, 3),
        (183, -13.5, 3),
        (183, -27.5, 3),
        (43, -13.5, 3),
        (43, 3.5, 3),
        (43, 17.5, 3),
        (-7, 17.5, 3),
        (43, -27.5, 3),
        (-7, -27.5, 3),
    ]]
    fillet(fillet1_edges, radius=FILLET1_R - 0.0001)  # a hair under: the kernel refuses the full size


solid = part.part
